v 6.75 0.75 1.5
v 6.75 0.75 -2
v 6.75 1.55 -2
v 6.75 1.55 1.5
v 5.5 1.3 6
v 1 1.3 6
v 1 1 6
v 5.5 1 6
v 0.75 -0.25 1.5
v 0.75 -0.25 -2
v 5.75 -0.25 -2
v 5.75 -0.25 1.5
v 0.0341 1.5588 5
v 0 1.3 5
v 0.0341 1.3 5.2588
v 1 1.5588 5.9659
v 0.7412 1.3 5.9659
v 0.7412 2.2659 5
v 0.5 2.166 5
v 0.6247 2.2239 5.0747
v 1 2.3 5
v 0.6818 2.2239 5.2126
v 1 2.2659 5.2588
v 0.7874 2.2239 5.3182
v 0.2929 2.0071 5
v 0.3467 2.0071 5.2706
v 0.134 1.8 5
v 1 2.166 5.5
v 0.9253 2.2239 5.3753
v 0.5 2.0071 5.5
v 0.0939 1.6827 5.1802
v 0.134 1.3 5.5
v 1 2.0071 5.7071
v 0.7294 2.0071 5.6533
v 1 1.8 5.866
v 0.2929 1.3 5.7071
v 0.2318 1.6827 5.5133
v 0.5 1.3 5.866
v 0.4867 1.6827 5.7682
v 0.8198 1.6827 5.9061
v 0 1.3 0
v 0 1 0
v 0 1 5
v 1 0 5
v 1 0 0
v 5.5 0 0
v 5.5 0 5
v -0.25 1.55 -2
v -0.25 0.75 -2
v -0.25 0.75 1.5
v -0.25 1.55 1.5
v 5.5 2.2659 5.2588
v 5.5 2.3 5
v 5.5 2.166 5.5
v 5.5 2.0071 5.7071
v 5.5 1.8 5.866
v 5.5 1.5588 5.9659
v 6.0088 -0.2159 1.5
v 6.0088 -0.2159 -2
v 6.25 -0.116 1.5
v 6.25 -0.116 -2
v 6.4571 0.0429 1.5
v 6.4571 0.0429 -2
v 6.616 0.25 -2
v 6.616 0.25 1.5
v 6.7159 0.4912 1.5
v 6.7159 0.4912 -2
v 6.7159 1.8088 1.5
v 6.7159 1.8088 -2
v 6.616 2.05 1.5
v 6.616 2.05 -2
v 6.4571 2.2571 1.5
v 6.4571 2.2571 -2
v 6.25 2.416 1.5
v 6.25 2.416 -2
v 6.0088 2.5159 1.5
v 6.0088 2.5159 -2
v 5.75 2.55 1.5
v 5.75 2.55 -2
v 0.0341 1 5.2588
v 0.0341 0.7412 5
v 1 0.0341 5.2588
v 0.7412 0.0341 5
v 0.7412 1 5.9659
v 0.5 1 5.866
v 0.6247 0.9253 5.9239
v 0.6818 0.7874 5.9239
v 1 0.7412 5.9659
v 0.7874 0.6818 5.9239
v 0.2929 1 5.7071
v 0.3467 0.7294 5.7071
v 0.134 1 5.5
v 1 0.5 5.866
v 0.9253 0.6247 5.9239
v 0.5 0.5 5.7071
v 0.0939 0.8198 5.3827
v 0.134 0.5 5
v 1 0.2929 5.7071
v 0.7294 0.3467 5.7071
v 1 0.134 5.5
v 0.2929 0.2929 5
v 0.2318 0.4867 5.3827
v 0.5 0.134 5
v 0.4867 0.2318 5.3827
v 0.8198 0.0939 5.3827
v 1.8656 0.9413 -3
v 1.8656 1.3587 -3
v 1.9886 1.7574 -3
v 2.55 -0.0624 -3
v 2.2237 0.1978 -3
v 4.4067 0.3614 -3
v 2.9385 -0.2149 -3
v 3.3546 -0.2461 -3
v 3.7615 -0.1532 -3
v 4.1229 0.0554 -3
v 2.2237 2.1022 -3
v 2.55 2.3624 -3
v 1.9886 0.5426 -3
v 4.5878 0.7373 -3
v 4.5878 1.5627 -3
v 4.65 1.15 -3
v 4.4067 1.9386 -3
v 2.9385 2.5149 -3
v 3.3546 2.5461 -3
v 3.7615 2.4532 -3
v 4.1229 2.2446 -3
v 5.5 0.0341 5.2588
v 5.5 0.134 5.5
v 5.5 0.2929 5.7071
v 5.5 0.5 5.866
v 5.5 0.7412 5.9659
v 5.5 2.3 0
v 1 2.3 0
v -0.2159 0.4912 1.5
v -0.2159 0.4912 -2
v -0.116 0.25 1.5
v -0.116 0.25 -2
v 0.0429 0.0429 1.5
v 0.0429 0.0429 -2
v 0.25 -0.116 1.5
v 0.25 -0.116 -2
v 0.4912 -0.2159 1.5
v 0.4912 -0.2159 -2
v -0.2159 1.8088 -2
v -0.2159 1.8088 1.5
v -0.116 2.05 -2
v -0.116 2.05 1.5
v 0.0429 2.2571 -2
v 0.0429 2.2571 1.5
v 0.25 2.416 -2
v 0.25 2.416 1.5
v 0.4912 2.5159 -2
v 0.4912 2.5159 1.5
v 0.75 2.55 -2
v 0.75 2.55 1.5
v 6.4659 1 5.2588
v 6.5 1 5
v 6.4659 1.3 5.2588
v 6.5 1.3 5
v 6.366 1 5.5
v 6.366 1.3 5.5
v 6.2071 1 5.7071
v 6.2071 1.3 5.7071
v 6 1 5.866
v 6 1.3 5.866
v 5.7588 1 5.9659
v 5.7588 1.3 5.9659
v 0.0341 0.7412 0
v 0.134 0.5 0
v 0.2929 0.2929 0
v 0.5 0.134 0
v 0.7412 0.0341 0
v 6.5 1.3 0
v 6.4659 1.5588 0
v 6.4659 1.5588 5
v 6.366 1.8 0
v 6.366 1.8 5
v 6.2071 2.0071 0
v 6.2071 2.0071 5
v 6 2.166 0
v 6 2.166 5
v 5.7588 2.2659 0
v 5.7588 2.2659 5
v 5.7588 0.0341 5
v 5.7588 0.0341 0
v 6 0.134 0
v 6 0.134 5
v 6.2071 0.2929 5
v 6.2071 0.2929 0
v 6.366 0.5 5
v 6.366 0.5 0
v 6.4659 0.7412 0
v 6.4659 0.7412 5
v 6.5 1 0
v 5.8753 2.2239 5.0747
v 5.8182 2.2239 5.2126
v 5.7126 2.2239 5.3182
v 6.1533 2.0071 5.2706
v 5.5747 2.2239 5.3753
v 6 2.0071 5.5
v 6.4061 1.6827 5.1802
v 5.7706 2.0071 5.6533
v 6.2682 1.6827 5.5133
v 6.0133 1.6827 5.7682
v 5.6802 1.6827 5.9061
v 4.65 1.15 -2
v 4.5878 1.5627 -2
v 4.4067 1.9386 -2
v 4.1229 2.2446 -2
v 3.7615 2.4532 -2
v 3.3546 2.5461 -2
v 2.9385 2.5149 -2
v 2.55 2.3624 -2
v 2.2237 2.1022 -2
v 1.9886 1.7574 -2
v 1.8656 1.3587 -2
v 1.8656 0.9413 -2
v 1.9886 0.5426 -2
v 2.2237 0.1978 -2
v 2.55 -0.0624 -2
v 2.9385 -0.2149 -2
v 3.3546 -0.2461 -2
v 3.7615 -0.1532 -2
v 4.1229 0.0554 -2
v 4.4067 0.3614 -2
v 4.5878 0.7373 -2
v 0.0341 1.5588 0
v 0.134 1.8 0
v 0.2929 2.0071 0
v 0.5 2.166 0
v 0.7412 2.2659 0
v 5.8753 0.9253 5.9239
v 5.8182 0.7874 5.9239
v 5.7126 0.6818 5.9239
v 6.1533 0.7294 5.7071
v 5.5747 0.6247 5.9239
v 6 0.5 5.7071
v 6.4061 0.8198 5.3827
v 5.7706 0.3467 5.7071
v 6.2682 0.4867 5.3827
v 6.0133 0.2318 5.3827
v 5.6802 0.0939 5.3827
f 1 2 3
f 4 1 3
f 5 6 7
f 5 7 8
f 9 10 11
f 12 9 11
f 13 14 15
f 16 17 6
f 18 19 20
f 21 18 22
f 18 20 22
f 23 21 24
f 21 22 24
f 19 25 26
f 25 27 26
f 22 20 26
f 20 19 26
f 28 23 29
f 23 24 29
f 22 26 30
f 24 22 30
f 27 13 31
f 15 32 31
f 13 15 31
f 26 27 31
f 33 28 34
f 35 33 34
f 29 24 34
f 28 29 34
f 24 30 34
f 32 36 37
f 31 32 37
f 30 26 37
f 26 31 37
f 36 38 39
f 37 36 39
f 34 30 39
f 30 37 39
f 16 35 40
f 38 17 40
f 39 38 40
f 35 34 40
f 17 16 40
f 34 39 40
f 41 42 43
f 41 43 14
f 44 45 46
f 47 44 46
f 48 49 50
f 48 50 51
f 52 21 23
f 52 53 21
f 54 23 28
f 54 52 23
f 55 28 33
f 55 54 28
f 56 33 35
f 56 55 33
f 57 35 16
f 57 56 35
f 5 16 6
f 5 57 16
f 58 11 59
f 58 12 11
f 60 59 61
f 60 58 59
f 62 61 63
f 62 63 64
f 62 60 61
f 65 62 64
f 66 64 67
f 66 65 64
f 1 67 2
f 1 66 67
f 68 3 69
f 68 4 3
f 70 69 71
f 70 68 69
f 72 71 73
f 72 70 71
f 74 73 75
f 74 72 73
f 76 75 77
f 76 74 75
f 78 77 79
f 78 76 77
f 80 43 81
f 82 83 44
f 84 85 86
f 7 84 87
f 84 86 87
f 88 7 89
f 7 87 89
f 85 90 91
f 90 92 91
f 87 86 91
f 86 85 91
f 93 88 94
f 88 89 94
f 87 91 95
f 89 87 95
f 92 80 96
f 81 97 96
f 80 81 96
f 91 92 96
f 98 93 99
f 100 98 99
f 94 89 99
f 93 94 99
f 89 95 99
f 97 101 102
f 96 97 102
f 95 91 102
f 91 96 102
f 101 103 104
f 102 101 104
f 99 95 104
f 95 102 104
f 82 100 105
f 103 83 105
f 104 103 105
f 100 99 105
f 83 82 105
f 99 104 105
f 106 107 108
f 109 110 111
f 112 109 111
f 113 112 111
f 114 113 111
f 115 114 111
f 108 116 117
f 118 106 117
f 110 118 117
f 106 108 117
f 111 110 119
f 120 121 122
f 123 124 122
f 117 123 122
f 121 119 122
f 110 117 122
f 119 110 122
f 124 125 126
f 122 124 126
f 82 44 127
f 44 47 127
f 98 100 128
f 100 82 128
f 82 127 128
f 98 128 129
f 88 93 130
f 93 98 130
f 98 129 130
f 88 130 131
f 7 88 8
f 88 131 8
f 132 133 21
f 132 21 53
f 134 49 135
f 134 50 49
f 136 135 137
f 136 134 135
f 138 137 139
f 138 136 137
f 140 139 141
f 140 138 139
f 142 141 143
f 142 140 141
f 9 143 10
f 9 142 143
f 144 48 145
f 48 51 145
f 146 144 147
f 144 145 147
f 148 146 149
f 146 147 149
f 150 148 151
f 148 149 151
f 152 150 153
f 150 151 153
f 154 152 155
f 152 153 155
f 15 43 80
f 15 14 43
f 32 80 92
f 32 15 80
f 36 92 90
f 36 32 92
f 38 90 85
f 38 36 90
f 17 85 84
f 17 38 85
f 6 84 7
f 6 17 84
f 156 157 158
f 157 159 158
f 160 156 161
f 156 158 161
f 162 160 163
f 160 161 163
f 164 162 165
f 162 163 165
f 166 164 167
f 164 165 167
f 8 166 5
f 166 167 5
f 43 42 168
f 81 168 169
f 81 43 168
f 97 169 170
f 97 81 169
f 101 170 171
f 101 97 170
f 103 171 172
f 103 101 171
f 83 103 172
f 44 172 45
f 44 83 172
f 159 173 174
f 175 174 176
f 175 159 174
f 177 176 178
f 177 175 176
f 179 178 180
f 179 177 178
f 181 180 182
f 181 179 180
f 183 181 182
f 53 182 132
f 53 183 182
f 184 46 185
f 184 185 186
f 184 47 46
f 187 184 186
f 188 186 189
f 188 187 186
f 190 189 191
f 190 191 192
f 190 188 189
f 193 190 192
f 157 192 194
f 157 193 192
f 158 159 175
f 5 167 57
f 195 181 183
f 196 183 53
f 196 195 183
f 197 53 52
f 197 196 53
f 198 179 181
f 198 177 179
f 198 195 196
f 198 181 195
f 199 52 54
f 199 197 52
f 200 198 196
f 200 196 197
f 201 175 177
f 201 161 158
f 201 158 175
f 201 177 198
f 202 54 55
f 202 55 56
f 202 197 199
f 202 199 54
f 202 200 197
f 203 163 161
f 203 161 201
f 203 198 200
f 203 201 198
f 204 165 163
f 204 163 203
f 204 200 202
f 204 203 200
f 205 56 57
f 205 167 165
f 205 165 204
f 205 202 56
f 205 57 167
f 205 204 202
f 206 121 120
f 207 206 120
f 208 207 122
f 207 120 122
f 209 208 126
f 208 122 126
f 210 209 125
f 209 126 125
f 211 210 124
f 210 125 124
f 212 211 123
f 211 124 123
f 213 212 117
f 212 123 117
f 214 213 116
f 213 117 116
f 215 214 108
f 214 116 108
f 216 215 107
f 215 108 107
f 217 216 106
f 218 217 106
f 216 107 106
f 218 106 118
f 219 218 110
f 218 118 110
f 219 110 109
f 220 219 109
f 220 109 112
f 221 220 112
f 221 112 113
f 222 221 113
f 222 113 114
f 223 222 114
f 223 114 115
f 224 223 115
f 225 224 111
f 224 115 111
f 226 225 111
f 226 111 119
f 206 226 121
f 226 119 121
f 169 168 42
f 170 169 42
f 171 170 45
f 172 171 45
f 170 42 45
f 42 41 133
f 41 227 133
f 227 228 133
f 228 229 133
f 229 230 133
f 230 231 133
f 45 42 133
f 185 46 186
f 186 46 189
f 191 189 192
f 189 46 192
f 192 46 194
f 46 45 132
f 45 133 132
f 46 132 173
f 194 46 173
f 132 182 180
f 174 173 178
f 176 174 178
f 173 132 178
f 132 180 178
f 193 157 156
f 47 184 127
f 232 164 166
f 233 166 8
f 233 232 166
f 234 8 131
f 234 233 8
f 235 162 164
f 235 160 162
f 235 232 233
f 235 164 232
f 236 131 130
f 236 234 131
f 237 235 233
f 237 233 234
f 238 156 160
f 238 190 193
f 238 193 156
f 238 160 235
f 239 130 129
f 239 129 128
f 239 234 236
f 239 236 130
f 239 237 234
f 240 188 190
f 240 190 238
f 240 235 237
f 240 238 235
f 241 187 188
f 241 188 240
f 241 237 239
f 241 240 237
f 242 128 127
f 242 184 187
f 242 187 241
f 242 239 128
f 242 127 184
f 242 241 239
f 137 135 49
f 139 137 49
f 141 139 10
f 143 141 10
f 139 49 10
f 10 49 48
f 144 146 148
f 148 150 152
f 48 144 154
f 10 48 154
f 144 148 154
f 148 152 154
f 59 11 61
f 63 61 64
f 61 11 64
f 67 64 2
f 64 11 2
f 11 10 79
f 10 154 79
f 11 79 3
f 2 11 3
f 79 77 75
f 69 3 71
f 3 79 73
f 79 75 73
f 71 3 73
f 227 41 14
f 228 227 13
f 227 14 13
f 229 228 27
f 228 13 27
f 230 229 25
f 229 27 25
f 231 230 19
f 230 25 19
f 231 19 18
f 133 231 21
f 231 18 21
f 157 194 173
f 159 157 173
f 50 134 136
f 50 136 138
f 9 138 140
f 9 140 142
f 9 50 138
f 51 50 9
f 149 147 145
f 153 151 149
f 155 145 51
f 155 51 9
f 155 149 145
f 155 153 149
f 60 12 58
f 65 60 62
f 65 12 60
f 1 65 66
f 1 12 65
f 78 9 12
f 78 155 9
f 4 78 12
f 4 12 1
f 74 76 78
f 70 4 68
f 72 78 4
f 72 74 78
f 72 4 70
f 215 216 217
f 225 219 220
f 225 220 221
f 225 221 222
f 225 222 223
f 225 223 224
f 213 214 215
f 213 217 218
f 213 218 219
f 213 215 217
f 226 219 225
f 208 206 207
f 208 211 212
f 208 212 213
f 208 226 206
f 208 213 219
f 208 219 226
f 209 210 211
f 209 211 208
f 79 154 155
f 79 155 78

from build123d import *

# Parameters (mm, degrees)
BOX_W          = 6.5
BOX_H          = 2.3
BOX_DEPTH      = 6
FILLET_R       = 1
BOX001_W       = 7
BOX001_H       = 2.8
BOX001_DEPTH   = 3.5
FILLET001_R    = 1
CYLINDER_R     = 1.4
CYLINDER_DEPTH = 1


with BuildPart() as fillet_body:
    # Box → Box (new body)
    with BuildSketch(Plane.XY):
        with Locations((3.25, 1.15)):
            Rectangle(BOX_W, BOX_H)
    extrude(amount=BOX_DEPTH)

    # Fillet
    fillet_edges = [fillet_body.edges().sort_by_distance(p)[0] for p in [
        (0, 0, 3),
        (0, 1.15, 6),
        (0, 2.3, 3),
        (6.5, 0, 3),
        (6.5, 1.15, 6),
        (6.5, 2.3, 3),
        (3.25, 0, 6),
        (3.25, 2.3, 6),
    ]]
    fillet(fillet_edges, radius=FILLET_R)


with BuildPart() as fillet001:
    # Box001 → Box001 (new body)
    with BuildSketch(Plane(origin=(-0.25, -0.25, -2), x_dir=(1, 0, 0), z_dir=(0, 0, 1))):
        with Locations((3.5, 1.4)):
            Rectangle(BOX001_W, BOX001_H)
    extrude(amount=BOX001_DEPTH)

    # Fillet001
    fillet001_edges = [fillet001.edges().sort_by_distance(p)[0] for p in [
        (-0.25, -0.25, -0.25),
        (-0.25, 2.55, -0.25),
        (6.75, -0.25, -0.25),
        (6.75, 2.55, -0.25),
    ]]
    fillet(fillet001_edges, radius=FILLET001_R)


with BuildPart() as cylinder:
    # Cylinder → Cylinder (new body)
    with BuildSketch(Plane(origin=(3.25, 1.15, -3), x_dir=(1, 0, 0), z_dir=(0, 0, 1))):
        Circle(CYLINDER_R)
    extrude(amount=CYLINDER_DEPTH)


solid = Compound([fillet_body.part, fillet001.part, cylinder.part])
